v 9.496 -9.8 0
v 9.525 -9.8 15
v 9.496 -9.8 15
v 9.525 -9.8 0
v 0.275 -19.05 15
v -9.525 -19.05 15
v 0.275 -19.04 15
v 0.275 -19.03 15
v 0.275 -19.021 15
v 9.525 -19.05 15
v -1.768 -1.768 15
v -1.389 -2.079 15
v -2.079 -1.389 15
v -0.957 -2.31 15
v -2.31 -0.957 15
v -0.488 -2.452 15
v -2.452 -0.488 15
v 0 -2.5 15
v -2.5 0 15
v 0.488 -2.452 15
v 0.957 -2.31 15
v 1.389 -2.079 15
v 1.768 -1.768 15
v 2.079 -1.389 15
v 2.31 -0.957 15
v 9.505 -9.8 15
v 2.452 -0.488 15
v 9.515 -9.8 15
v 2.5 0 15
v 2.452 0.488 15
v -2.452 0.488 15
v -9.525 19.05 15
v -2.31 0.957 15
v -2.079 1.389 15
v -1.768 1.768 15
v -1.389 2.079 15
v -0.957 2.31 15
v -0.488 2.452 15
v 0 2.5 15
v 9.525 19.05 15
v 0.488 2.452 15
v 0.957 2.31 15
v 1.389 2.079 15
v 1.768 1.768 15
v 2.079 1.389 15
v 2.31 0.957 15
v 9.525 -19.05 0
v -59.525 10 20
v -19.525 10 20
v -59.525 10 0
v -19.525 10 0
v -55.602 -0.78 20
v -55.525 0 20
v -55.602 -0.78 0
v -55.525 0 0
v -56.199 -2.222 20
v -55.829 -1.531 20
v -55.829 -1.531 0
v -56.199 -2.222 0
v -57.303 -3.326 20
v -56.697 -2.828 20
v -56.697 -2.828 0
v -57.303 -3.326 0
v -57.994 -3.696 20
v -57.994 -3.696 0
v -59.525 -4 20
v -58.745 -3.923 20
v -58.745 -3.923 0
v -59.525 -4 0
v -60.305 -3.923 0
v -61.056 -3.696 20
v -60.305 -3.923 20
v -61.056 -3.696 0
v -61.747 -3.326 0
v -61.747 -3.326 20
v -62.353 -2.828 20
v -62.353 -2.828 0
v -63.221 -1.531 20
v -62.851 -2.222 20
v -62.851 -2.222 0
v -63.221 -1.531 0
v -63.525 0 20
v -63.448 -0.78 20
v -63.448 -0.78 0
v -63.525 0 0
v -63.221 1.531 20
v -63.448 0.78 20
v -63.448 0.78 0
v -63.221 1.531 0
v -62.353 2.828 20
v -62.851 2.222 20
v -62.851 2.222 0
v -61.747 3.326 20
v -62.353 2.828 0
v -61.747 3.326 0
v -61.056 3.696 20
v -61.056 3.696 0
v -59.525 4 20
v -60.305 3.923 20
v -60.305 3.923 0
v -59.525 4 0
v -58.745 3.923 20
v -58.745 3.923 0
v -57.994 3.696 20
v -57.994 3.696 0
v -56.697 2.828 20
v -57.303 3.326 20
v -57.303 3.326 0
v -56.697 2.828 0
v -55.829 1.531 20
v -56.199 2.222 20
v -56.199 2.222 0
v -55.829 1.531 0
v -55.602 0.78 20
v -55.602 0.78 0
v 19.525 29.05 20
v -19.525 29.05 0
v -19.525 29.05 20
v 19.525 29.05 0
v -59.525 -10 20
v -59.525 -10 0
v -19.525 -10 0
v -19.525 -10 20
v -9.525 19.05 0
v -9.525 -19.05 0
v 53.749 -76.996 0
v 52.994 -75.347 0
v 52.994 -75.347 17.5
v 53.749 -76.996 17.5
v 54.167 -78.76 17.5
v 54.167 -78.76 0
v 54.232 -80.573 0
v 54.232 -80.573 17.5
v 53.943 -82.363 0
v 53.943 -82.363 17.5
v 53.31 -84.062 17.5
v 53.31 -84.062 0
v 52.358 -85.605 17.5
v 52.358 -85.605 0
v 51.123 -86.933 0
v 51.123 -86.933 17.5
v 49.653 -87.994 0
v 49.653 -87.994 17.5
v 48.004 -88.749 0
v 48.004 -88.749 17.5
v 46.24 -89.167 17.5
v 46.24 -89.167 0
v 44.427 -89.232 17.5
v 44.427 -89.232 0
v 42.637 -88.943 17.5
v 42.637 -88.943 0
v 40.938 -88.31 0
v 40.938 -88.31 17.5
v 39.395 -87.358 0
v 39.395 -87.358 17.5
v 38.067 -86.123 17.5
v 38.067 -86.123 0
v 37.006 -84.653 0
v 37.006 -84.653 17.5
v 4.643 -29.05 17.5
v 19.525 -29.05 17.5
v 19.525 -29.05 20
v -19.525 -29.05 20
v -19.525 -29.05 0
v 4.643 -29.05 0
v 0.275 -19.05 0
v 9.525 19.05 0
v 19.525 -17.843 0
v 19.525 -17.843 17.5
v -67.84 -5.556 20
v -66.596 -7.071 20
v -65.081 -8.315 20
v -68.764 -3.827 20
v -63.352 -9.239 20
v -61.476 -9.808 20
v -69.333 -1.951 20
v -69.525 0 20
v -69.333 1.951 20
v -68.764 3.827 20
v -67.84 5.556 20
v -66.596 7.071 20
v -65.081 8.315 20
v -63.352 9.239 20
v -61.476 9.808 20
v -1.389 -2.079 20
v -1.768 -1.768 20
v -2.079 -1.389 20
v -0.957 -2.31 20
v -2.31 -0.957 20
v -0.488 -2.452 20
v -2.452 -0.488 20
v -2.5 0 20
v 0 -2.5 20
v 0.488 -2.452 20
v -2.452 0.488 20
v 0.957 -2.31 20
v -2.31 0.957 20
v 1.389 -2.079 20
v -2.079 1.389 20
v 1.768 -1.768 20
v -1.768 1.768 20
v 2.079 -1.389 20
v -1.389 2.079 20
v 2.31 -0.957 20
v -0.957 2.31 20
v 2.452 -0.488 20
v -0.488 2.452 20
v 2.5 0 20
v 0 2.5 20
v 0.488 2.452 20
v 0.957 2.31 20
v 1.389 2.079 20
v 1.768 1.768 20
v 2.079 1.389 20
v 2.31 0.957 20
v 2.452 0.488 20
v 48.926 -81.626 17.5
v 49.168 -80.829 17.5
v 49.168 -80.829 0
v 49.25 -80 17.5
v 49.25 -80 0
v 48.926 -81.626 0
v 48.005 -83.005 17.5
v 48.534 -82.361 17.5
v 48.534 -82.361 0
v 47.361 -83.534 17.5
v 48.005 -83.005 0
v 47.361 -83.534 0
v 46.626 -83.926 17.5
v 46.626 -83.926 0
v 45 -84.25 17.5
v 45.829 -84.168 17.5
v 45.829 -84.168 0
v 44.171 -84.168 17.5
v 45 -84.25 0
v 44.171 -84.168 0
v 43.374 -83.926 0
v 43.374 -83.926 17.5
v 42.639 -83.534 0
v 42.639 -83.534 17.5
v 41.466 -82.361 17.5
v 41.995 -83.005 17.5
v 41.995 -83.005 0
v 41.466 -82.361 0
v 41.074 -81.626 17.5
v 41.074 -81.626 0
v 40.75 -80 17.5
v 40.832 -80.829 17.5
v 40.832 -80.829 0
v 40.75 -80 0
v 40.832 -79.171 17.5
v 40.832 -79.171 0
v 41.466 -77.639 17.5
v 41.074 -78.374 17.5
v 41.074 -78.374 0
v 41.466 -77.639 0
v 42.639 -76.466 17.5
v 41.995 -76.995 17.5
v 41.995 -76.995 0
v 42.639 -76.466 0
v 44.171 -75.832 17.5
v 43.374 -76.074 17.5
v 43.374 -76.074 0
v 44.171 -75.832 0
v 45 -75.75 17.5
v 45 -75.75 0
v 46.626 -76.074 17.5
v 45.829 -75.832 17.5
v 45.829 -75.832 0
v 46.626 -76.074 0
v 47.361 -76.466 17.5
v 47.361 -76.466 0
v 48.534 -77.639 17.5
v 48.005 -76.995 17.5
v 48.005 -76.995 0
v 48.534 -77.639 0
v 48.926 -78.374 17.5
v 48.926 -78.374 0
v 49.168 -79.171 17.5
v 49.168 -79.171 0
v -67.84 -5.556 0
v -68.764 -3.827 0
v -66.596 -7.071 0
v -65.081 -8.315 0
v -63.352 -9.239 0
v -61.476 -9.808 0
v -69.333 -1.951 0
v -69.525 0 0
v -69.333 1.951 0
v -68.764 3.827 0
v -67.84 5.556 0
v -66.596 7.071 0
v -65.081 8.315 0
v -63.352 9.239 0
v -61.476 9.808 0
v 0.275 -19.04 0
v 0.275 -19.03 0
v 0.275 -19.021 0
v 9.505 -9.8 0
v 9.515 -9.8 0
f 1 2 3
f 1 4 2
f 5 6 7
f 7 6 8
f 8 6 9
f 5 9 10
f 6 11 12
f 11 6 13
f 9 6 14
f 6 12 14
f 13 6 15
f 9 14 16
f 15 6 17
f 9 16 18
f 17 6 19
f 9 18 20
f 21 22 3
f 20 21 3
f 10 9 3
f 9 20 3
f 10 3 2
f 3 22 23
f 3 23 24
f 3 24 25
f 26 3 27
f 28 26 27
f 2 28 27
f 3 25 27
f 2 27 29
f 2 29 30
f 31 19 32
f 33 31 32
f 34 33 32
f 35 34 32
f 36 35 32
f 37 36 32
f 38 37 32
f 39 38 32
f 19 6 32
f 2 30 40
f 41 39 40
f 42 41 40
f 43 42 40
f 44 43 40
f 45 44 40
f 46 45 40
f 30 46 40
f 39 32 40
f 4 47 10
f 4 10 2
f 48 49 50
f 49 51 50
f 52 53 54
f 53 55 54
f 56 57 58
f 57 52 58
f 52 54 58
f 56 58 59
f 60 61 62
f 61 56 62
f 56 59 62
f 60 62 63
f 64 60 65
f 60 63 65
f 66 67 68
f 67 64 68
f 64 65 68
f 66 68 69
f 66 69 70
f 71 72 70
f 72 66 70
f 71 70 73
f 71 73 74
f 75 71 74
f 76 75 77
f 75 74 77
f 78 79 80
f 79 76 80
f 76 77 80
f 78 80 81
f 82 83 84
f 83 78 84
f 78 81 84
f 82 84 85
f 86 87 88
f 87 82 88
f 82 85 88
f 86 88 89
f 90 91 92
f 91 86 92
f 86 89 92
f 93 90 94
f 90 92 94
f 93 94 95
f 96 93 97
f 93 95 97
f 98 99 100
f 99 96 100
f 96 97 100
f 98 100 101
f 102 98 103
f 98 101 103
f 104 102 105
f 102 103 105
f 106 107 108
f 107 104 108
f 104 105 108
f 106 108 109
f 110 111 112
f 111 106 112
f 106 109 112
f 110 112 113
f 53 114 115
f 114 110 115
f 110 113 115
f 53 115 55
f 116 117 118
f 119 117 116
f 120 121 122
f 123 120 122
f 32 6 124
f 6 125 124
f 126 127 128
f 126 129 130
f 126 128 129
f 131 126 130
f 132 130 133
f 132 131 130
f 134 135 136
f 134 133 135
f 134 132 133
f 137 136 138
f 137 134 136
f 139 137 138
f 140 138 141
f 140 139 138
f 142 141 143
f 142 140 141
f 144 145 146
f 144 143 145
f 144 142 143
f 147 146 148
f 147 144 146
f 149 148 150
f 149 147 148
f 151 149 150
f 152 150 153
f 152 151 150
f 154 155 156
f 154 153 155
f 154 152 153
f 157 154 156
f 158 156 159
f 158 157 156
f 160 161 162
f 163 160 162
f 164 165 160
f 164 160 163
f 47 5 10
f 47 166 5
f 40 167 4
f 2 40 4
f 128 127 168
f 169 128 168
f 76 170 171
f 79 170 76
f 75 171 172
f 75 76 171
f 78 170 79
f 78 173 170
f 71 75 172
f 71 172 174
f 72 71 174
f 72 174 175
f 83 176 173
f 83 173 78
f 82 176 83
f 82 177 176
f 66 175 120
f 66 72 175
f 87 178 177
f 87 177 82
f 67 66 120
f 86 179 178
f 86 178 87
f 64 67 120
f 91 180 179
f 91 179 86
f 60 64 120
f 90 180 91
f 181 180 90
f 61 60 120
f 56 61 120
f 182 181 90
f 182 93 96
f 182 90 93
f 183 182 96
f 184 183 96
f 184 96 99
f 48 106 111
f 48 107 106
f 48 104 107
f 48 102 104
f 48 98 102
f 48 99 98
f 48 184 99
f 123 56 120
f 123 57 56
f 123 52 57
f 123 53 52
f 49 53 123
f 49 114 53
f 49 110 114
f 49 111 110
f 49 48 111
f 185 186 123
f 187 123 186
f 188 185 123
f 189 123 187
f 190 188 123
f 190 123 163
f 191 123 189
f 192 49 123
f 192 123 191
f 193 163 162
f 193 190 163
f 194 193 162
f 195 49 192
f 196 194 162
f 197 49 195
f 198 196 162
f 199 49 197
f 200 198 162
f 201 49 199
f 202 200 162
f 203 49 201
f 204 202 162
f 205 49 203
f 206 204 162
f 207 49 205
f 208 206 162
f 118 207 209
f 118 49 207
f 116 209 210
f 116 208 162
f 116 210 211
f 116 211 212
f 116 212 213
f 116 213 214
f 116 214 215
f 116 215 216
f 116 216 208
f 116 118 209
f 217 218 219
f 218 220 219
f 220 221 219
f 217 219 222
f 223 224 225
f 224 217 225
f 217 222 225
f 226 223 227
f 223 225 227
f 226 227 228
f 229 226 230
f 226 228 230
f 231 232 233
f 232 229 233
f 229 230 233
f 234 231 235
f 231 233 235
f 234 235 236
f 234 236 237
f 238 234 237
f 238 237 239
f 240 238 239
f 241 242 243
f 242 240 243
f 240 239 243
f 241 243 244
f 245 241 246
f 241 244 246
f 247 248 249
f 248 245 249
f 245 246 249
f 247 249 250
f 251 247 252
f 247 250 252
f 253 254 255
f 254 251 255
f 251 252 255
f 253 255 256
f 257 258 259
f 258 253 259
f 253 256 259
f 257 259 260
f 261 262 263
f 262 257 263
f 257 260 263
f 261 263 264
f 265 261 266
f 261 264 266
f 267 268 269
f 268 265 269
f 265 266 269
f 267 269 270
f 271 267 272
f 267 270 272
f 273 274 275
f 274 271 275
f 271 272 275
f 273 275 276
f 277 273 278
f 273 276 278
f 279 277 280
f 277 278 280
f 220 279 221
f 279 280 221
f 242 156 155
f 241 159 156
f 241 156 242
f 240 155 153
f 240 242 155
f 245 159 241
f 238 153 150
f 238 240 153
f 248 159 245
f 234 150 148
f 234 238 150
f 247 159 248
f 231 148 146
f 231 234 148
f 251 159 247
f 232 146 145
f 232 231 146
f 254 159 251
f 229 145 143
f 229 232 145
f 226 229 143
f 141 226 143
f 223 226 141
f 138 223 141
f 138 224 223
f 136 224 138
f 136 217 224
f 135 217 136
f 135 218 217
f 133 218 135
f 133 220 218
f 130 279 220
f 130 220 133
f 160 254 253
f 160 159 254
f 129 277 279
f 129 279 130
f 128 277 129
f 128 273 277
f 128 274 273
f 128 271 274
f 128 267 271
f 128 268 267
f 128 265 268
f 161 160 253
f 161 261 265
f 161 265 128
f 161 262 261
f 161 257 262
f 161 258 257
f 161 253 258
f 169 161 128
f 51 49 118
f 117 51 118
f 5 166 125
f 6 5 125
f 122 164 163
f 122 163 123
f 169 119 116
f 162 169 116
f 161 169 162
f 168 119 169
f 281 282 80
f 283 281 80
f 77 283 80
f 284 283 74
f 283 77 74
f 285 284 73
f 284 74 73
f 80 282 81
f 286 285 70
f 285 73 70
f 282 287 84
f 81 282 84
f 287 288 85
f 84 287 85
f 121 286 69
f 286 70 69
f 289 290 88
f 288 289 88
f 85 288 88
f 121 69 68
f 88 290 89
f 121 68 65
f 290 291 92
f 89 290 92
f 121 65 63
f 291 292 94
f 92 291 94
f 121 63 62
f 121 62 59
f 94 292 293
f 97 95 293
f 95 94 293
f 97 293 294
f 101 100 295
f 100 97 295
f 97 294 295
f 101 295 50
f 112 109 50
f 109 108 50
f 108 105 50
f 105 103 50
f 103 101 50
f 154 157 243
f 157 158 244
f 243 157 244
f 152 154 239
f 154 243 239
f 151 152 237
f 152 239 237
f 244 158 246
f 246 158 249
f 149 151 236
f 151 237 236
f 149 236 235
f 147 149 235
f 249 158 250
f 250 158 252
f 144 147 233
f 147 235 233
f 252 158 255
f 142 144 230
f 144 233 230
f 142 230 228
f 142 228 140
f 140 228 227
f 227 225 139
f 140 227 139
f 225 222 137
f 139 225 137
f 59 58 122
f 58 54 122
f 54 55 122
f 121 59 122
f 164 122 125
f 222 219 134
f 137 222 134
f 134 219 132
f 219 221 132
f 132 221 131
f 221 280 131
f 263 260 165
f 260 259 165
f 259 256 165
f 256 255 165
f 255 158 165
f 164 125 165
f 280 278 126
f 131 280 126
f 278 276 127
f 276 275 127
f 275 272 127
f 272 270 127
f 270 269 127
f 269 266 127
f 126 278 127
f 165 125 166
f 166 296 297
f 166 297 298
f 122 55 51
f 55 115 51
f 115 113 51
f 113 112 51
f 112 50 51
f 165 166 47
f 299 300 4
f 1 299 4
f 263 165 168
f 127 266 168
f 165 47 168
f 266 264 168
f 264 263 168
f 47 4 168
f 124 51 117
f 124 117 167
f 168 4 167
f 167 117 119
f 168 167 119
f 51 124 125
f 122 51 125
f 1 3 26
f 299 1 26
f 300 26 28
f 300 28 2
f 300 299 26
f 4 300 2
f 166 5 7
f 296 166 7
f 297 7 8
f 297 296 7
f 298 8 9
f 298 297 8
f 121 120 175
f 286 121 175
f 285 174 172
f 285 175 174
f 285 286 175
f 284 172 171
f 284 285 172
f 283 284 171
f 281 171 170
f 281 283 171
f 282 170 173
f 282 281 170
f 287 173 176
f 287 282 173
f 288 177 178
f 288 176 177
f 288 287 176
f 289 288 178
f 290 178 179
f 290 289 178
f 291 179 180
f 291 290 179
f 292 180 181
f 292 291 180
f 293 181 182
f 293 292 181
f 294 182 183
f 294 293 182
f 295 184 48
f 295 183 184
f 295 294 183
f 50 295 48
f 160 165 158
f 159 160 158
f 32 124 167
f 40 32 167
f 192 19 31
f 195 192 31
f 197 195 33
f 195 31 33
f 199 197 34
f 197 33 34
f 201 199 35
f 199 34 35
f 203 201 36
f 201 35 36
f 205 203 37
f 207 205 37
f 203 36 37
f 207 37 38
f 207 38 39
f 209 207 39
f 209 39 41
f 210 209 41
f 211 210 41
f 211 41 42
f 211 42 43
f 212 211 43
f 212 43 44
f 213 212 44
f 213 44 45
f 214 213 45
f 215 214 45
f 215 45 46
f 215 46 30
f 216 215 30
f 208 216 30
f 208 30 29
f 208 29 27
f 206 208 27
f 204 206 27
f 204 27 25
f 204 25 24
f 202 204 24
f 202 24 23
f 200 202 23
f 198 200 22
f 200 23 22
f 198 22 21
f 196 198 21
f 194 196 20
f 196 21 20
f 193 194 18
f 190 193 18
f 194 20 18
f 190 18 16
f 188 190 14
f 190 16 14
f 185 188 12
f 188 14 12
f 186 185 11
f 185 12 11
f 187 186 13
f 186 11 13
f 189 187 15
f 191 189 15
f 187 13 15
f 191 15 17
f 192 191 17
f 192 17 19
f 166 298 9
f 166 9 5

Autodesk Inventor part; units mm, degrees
ref_plane "YZ Plane" through (0, 0, 0) normal (1, 0, 0) x (0, 1, 0)
ref_plane "XZ Plane" through (0, 0, 0) normal (0, 1, 0) x (-1, 0, 0)
sketch "Sketch1" plane through (0, 0, 0) normal (0, 0, 1) x (1, 0, 0)
  line L0 (9.525, -19.05) -> (-9.525, -19.05)
  line L1 (-9.525, -19.05) -> (-9.525, 19.05)
  line L2 (-9.525, 19.05) -> (9.525, 19.05)
  line L3 (9.525, 19.05) -> (9.525, -19.05)
  line L4 (9.525, -19.05) -> (-9.525, 19.05) construction
  line L5 (-9.525, -19.05) -> (9.525, 19.05) construction
  line L6 (19.525, -29.05) -> (-19.525, -29.05)
  line L7 (-19.525, -29.05) -> (-19.525, 29.05)
  line L8 (-19.525, 29.05) -> (19.525, 29.05)
  line L9 (19.525, 29.05) -> (19.525, -29.05)
  line L10 (19.525, -29.05) -> (-19.525, 29.05) construction
  line L11 (-19.525, -29.05) -> (19.525, 29.05) construction
  line L12 (-19.525, 0) -> (-59.525, 0) construction
  circle A0 centre (-59.525, 0) radius 4
  line L13 (-59.525, 0) -> (-19.525, 0) construction
  line L14 (-59.525, -10) -> (-19.525, -10)
  line L15 (-19.525, 10) -> (-59.525, 10)
  arc A1 (-59.525, 10) -> (-59.525, -10) centre (-59.525, 0) ccw
  arc A2 (-19.525, -10) -> (-19.525, 10) centre (-19.525, 0) ccw construction
  line L16 (-19.525, 10) -> (-19.525, -10)
  point P0 (0, 0)
  point P1 (-39.525, 0)
  dimension "d0" = 38.1
  dimension "d1" = 19.05
  dimension "d2" = 10
  dimension "d3" = 10
  dimension "d4" = 8
  dimension "d5" = 10
  dimension "d6" = 40
extrude "Extrusion1" add sketch "Sketch1" along normal blind 15
sketch "Sketch2" plane through (0, 0, 15) normal (0, 0, 1) x (1, 0, 0)
  line L0 (-9.525, -19.05) -> (-9.525, 19.05) projected
  line L1 (-9.525, 19.05) -> (9.525, 19.05) projected
  line L2 (9.525, 19.05) -> (9.525, -19.05) projected
  line L3 (9.525, -19.05) -> (-9.525, -19.05) projected
  circle A0 centre (-59.525, 0) radius 4 projected
  line L4 (-59.525, -10) -> (-19.525, -10) projected
  line L5 (-19.525, -10) -> (-19.525, -29.05) projected
  line L6 (-19.525, -29.05) -> (19.525, -29.05) projected
  line L7 (19.525, -29.05) -> (19.525, 29.05) projected
  line L8 (19.525, 29.05) -> (-19.525, 29.05) projected
  line L9 (-19.525, 29.05) -> (-19.525, 10) projected
  line L10 (-19.525, 10) -> (-59.525, 10) projected
  arc A1 (-59.525, 10) -> (-59.525, -10) centre (-59.525, 0) ccw projected
  point P0 (0, 0)
extrude "Extrusion2" add sketch "Sketch2" along normal blind 5 contours L0 L1 L2 L3 | A1 L10 L9 L8 L7 L6 L5 L4
sketch "Sketch3" plane through (0, 0, 15) normal (0, 0, -1) x (-1, 0, 0)
  circle A0 centre (0, 0) radius 2.5
  dimension "d11" = 5
extrude "Extrusion3" cut sketch "Sketch3" against normal through all
sketch "Sketch4" plane through (0, 0, 20) normal (0, 0, 1) x (1, 0, 0)
  line L0 (0, 0) -> (45, 0) construction
  line L1 (45, 0) -> (45, -80) construction
  line L2 (45, -80) -> (0, -80) construction
  line L3 (0, -80) -> (0, 0) construction
  circle A0 centre (45, -80) radius 4.25
  line L4 (19.525, -29.05) -> (-19.525, -29.05) construction
  line L5 (19.525, -29.05) -> (9.525, -29.05) construction
  line L6 (9.525, -29.05) -> (9.525, -19.05) construction
  line L7 (9.525, -19.05) -> (19.525, -19.05) construction
  line L8 (19.525, -19.05) -> (19.525, -29.05) construction
  line L9 (9.525, -19.05) -> (45, -80) construction
  line L10 (1.5305, -23.7031) -> (37.0055, -84.6531)
  line L11 (52.9945, -75.3469) -> (17.5195, -14.3969)
  arc A1 (17.5195, -14.3969) -> (1.5305, -23.7031) centre (9.525, -19.05) ccw
  arc A2 (37.0055, -84.6531) -> (52.9945, -75.3469) centre (45, -80) ccw
  point P0 (27.2625, -49.525)
  dimension "d14" = 80
  dimension "d15" = 45
  dimension "d16" = 8.5
  dimension "d17" = 10
  dimension "d18" = 10
  dimension "d19" = 5
ref_plane "Work Plane1" through (26.995, -107.2374, 17.5) normal (0, 0, -1) x (0.0784, 0.9969, 0)
extrude "Extrusion4" add sketch "Sketch4" along normal up to surface (17.5 mm away) from surface at -20
sketch "Sketch5" plane through (0, 0, 0) normal (0, 0, -1) x (-1, 0, 0)
  circle A0 centre (-45, -80) radius 4.25 projected
  line L0 (-9.525, -9.8) -> (-9.525, 19.05) projected
  line L1 (-9.525, 19.05) -> (9.525, 19.05) projected
  line L2 (9.525, 19.05) -> (9.525, -19.05) projected
  line L3 (9.525, -19.05) -> (-0.275, -19.05) projected
  arc A1 (-0.275, -19.05) -> (-9.525, -9.8) centre (-9.525, -19.05) ccw projected
  line L4 (-19.525, -17.8427) -> (-52.9945, -75.3469) projected
  arc A2 (-52.9945, -75.3469) -> (-37.0055, -84.6531) centre (-45, -80) ccw projected
  line L5 (-37.0055, -84.6531) -> (-4.6426, -29.05) projected
  line L6 (-4.6426, -29.05) -> (19.525, -29.05) projected
  line L7 (19.525, -29.05) -> (19.525, -10) projected
  line L8 (59.525, -10) -> (19.525, -10) projected
  arc A3 (59.525, -10) -> (59.525, 10) centre (59.525, 0) ccw projected
  line L9 (19.525, 10) -> (59.525, 10) projected
  line L10 (19.525, 10) -> (19.525, 29.05) projected
  line L11 (19.525, 29.05) -> (-19.525, 29.05) projected
  line L12 (-19.525, 29.05) -> (-19.525, -17.8427) projected
  circle A4 centre (59.525, 0) radius 4 projected
  arc A5 (-0.275, -19.05) -> (-9.525, -9.8) centre (-9.525, -19.05) ccw projected
  line L13 (-0.275, -19.05) -> (-9.525, -19.05)
  line L14 (-9.525, -19.05) -> (-9.525, -9.8)
  line L15 (-9.525, -9.8) -> (-0.275, -9.8)
  line L16 (-0.275, -9.8) -> (-0.275, -19.05)
  point P0 (0, 0)
extrude "Extrusion5" cut sketch "Sketch5" against normal up to surface (15 mm away) contours L15 L16 A1 | A1 L13 L14
properties part number "tiller frame bracket"
